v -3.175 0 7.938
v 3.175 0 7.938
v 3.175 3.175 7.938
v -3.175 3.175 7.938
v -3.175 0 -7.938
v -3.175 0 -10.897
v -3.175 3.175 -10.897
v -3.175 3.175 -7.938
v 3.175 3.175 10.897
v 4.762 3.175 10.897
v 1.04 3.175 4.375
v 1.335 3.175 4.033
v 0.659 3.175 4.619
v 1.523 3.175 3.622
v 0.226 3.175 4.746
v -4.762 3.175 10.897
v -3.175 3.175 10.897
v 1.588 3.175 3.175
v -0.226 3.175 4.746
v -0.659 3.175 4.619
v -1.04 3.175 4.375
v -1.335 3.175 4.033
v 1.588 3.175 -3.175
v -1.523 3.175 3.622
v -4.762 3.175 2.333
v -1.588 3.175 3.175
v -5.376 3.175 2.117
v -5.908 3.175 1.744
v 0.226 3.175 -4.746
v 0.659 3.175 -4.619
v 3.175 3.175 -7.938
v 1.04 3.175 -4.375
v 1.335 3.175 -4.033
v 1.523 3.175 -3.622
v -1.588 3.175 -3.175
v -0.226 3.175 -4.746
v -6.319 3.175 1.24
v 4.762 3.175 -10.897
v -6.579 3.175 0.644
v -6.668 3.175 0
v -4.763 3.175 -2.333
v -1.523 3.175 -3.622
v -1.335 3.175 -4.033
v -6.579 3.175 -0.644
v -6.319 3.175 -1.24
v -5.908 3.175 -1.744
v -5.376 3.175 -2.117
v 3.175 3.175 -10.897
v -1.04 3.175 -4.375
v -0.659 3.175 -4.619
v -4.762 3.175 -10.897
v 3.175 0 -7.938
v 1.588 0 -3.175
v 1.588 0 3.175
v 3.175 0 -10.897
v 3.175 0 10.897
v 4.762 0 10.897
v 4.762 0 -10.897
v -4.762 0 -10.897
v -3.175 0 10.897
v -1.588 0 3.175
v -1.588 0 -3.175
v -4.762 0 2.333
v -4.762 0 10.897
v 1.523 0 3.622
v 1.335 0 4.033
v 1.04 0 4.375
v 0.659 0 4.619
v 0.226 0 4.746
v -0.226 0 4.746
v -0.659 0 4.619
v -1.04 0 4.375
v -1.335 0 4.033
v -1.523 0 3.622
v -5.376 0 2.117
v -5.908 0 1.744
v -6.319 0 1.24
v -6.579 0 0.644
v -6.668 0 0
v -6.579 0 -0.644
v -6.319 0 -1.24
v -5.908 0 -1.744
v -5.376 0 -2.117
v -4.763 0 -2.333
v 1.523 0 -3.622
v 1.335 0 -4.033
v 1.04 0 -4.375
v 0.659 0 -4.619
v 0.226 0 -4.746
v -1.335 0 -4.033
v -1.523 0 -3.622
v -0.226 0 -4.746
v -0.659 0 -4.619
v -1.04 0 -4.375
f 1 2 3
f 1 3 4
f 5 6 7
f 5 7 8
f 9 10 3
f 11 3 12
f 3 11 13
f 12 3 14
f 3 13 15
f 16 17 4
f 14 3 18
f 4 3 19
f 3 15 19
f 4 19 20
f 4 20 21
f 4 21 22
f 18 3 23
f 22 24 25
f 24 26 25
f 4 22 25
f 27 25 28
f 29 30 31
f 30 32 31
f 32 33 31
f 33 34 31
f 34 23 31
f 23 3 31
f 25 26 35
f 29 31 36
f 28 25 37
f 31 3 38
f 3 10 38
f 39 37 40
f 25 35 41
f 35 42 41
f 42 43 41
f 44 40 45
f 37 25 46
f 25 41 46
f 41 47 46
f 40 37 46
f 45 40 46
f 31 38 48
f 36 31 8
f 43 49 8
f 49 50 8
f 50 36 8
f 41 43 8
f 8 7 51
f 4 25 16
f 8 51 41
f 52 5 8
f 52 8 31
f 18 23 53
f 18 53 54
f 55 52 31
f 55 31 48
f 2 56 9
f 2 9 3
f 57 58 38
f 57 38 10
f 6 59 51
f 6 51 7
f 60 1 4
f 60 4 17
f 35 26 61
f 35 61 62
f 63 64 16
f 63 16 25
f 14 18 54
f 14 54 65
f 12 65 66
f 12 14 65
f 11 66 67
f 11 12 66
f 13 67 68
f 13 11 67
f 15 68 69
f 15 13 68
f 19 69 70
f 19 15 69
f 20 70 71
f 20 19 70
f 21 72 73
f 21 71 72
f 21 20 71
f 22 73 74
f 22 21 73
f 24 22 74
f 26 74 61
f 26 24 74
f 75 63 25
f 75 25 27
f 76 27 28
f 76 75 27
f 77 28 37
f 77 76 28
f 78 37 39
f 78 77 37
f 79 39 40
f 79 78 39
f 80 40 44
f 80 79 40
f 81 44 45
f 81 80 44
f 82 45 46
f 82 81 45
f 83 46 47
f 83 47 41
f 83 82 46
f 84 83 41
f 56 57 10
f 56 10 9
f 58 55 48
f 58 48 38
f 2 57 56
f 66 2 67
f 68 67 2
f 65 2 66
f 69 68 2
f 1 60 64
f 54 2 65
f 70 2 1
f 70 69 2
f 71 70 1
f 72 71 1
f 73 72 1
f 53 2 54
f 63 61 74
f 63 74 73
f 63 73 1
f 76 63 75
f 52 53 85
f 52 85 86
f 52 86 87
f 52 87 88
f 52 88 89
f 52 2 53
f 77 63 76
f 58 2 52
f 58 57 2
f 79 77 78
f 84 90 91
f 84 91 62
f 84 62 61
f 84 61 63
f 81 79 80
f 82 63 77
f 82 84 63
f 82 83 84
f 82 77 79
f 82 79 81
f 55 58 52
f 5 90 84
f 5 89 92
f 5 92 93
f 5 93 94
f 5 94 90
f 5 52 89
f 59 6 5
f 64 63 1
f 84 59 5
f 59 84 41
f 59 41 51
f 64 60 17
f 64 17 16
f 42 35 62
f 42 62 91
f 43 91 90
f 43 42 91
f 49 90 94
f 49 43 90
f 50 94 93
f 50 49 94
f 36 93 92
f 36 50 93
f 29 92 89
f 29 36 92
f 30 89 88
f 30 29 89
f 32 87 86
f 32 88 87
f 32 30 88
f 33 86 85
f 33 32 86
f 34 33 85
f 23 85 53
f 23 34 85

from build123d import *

# Parameters (mm, degrees)
BOSS_EXTRUDE1_DEPTH = 3.175
CUT_EXTRUDE1_REACH  = 5.175


with BuildPart() as part:
    # Sketch2 → Boss-Extrude1 (new body)
    with BuildSketch(Plane(origin=(0, 0, 0), x_dir=(1, 0, 0), z_dir=(0, 1, 0))):
        with BuildLine():
            Line((-3.175, 10.8966), (-3.175, 7.9375))
            Line((-3.175, 7.9375), (3.175, 7.9375))
            Line((3.175, 7.9375), (3.175, 10.8966))
            Line((3.175, 10.8966), (4.7625, 10.8966))
            Line((4.7625, 10.8966), (4.7625, -10.8966))
            Line((4.7625, -10.8966), (3.175, -10.8966))
            Line((3.175, -10.8966), (3.175, -7.9375))
            Line((3.175, -7.9375), (-3.175, -7.9375))
            Line((-3.175, -7.9375), (-3.175, -10.8966))
            Line((-3.175, -10.8966), (-4.7625, -10.8966))
            Line((-4.7625, -10.8966), (-4.7625, -2.33313898))
            ThreePointArc((-4.7625, -2.33313898), (-6.6675, 0), (-4.7625, 2.33313898))
            Line((-4.7625, 2.33313898), (-4.7625, 10.8966))
            Line((-4.7625, 10.8966), (-3.175, 10.8966))
        make_face()
    extrude(amount=BOSS_EXTRUDE1_DEPTH)

    # Sketch3 → Cut-Extrude1 (cut, up to next)
    with BuildSketch(Plane(origin=(0, 3.175, 0), x_dir=(1, 0, 0), z_dir=(0, 1, 0)), mode=Mode.PRIVATE) as cut_extrude1_sk1:
        with BuildLine():
            Line((1.5875, 3.175), (1.5875, -3.175))
            ThreePointArc((1.5875, -3.175), (0, -4.7625), (-1.5875, -3.175))
            Line((-1.5875, -3.175), (-1.5875, 3.175))
            ThreePointArc((-1.5875, 3.175), (0, 4.7625), (1.5875, 3.175))
        make_face()
    cut_extrude1_tool1 = extrude(cut_extrude1_sk1.sketch, amount=-CUT_EXTRUDE1_REACH, mode=Mode.PRIVATE) & part.part
    add(cut_extrude1_tool1.solids().sort_by_distance((0, 3.175, 0))[0], mode=Mode.SUBTRACT)


solid = part.part
